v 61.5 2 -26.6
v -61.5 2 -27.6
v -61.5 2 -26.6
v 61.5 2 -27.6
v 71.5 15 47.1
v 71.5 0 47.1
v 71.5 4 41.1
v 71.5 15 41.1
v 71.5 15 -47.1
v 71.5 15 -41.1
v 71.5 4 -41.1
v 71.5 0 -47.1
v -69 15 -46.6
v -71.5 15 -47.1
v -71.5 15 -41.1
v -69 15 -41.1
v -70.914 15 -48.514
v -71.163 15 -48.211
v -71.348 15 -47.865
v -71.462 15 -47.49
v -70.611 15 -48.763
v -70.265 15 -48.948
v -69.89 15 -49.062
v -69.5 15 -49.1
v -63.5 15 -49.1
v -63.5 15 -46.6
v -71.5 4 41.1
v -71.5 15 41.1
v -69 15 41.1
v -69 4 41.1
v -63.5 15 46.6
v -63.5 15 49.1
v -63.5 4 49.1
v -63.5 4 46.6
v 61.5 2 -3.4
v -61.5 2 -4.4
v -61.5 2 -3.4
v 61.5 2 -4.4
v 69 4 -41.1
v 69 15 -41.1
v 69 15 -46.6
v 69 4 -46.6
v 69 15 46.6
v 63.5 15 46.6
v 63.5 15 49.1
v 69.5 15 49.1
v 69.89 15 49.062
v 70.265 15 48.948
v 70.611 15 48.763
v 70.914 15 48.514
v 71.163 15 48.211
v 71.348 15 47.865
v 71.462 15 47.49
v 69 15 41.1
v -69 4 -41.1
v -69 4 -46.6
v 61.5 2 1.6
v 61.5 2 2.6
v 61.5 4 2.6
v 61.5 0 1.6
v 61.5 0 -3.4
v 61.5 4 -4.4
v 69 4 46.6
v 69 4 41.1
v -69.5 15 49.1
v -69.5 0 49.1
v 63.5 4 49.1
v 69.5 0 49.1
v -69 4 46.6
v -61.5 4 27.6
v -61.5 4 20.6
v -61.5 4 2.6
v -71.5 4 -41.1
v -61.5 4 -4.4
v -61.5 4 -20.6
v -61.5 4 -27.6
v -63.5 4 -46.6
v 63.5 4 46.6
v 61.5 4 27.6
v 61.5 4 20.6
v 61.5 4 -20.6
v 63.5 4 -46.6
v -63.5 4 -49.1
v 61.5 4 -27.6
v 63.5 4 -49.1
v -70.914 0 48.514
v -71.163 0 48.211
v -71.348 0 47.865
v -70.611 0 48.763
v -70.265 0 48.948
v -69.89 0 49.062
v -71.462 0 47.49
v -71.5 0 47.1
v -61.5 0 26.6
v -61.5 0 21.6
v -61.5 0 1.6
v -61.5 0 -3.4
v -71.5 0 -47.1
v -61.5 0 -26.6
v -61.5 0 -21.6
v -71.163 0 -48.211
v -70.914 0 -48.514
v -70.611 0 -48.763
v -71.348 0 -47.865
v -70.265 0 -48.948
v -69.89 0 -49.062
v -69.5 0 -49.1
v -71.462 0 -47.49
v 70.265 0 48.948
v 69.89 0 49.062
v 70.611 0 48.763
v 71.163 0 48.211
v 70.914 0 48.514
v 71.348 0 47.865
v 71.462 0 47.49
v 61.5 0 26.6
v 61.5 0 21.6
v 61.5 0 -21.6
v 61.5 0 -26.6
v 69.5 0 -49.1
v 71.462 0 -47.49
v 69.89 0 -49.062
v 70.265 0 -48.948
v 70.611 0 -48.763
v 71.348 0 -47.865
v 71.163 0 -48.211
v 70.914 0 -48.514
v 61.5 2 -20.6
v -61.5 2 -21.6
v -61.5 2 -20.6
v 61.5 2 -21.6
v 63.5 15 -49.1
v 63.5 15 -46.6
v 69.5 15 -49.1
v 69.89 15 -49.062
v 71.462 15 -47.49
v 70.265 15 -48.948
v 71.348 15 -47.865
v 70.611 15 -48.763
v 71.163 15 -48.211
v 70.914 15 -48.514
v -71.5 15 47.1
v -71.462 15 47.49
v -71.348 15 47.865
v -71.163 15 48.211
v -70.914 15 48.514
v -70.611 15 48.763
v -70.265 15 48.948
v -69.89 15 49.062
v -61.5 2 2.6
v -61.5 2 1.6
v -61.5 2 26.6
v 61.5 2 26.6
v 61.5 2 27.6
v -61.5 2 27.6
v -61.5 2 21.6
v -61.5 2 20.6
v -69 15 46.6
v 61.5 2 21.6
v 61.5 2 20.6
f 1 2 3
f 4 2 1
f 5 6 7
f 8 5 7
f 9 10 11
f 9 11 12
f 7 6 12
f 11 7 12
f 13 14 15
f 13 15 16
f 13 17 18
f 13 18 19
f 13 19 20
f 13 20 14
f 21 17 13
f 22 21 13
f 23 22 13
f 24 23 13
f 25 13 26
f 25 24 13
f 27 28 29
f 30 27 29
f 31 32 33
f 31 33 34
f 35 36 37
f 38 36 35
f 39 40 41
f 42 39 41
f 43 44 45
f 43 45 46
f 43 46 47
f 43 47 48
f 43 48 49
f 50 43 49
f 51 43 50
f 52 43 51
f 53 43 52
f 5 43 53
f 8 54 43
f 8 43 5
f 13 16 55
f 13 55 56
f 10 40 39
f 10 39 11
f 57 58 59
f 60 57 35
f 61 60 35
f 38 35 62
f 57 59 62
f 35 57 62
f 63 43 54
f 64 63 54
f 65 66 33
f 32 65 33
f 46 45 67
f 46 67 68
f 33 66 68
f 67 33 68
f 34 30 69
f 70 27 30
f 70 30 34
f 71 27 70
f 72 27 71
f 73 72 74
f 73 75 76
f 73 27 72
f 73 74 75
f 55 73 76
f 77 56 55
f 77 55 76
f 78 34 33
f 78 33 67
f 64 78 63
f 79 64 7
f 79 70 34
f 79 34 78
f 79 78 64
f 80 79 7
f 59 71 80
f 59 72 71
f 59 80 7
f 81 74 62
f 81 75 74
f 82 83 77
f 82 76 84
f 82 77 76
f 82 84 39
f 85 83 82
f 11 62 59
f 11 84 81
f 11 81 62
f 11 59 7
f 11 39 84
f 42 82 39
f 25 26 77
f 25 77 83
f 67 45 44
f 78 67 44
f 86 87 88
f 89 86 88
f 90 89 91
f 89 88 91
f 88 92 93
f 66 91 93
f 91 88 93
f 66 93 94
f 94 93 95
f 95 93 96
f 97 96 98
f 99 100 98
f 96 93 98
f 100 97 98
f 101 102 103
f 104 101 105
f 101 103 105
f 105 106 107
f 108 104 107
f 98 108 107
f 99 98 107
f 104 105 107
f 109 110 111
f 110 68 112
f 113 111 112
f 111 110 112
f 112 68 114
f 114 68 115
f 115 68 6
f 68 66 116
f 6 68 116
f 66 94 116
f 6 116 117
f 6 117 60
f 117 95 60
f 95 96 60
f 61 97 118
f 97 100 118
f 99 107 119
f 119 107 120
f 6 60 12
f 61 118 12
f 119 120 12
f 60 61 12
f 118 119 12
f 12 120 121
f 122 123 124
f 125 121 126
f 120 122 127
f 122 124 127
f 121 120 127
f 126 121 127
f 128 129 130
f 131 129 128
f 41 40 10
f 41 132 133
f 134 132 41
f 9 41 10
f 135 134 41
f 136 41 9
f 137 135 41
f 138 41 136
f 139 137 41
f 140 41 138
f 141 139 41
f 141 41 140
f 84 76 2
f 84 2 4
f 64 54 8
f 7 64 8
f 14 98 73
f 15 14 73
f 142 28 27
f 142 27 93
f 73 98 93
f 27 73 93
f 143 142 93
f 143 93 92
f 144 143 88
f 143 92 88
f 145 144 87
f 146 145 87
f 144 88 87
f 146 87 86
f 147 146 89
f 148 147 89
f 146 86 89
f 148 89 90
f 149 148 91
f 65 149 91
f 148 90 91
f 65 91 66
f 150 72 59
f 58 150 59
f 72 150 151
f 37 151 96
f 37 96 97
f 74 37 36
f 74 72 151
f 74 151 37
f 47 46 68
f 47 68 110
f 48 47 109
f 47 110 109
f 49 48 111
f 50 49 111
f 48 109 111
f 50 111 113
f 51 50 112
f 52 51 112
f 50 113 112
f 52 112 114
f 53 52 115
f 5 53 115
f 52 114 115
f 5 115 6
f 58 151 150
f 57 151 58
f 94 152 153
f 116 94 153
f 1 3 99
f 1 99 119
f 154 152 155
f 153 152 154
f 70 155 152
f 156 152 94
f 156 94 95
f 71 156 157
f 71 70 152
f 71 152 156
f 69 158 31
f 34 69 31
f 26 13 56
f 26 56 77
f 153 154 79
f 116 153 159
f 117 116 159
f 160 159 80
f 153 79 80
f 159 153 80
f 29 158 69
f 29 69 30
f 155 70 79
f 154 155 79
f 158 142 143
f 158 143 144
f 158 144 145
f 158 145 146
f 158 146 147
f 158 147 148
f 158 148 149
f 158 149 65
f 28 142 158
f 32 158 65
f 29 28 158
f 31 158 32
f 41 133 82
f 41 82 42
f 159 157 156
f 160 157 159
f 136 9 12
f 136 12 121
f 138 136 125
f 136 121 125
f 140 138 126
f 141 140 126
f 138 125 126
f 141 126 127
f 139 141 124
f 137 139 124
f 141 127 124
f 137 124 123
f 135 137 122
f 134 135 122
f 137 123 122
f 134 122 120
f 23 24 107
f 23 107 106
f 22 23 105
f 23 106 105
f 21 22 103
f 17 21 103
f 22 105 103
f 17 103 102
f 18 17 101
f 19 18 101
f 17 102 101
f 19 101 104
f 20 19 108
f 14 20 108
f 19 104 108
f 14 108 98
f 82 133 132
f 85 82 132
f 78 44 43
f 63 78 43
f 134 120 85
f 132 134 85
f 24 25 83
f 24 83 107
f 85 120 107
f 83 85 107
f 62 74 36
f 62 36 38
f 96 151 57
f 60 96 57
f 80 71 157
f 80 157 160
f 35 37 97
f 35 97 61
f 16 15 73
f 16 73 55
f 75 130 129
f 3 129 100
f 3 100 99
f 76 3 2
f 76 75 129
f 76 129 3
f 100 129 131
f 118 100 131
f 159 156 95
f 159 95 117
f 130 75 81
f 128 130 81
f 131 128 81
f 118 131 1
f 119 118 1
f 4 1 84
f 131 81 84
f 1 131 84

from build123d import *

# Parameters (mm, degrees)
BOSS_EXTRUDE1_DEPTH = 15
SKETCH2_W           = 138
SKETCH2_H           = 93.2
CUT_EXTRUDE1_DEPTH  = 11
SKETCH3_W           = 2.5
SKETCH3_H           = 82.2
SKETCH3_W_2         = 127
SKETCH3_H_2         = 2.5
CUT_EXTRUDE2_DEPTH  = 11
SKETCH7_W           = 123
SKETCH7_H           = 7
CUT_EXTRUDE6_DEPTH  = 2
SKETCH8_W           = 123
SKETCH8_H           = 5
CUT_EXTRUDE7_DEPTH  = 10


with BuildPart() as part:
    # Sketch1 → Boss-Extrude1 (new body)
    with BuildSketch(Plane(origin=(0, 0, 0), x_dir=(1, 0, 0), z_dir=(0, 1, 0))):
        with BuildLine():
            Line((-69.5, -49.1), (69.5, -49.1))
            ThreePointArc((69.5, -49.1), (70.914213562, -48.514213562), (71.5, -47.1))
            Line((71.5, -47.1), (71.5, 47.1))
            ThreePointArc((71.5, 47.1), (70.914213562, 48.514213562), (69.5, 49.1))
            Line((69.5, 49.1), (-69.5, 49.1))
            ThreePointArc((-69.5, 49.1), (-70.914213562, 48.514213562), (-71.5, 47.1))
            Line((-71.5, 47.1), (-71.5, -47.1))
            ThreePointArc((-71.5, -47.1), (-70.914213562, -48.514213562), (-69.5, -49.1))
        make_face()
    extrude(amount=BOSS_EXTRUDE1_DEPTH)

    # Sketch2 → Cut-Extrude1 (cut)
    with BuildSketch(Plane(origin=(0, 15, 0), x_dir=(1, 0, 0), z_dir=(0, 1, 0))):
        Rectangle(SKETCH2_W, SKETCH2_H)
    extrude(amount=-CUT_EXTRUDE1_DEPTH, mode=Mode.SUBTRACT)

    # Sketch3 → Cut-Extrude2 (cut)
    with BuildSketch(Plane(origin=(0, 15, 0), x_dir=(1, 0, 0), z_dir=(0, 1, 0))):
        with Locations((-70.25, 0)):
            Rectangle(SKETCH3_W, SKETCH3_H)
        with Locations((0, 47.85)):
            Rectangle(SKETCH3_W_2, SKETCH3_H_2)
        with Locations((70.25, 0)):
            Rectangle(SKETCH3_W, SKETCH3_H)
        with Locations((0, -47.85)):
            Rectangle(SKETCH3_W_2, SKETCH3_H_2)
    extrude(amount=-CUT_EXTRUDE2_DEPTH, mode=Mode.SUBTRACT)

    # Sketch7 → Cut-Extrude6 (cut)
    with BuildSketch(Plane(origin=(0, 4, 0), x_dir=(1, 0, 0), z_dir=(0, 1, 0))):
        with Locations((0, 0.9)):
            Rectangle(SKETCH7_W, SKETCH7_H)
        with Locations((0, 24.1)):
            Rectangle(SKETCH7_W, SKETCH7_H)
        with Locations((0, -24.1)):
            Rectangle(SKETCH7_W, SKETCH7_H)
    extrude(amount=-CUT_EXTRUDE6_DEPTH, mode=Mode.SUBTRACT)

    # Sketch8 → Cut-Extrude7 (cut)
    with BuildSketch(Plane(origin=(0, 2, 0), x_dir=(1, 0, 0), z_dir=(0, 1, 0))):
        with Locations((0, 0.9)):
            Rectangle(SKETCH8_W, SKETCH8_H)
        with Locations((0, 24.1)):
            Rectangle(SKETCH8_W, SKETCH8_H)
        with Locations((0, -24.1)):
            Rectangle(SKETCH8_W, SKETCH8_H)
    extrude(amount=-CUT_EXTRUDE7_DEPTH, mode=Mode.SUBTRACT)


solid = part.part
